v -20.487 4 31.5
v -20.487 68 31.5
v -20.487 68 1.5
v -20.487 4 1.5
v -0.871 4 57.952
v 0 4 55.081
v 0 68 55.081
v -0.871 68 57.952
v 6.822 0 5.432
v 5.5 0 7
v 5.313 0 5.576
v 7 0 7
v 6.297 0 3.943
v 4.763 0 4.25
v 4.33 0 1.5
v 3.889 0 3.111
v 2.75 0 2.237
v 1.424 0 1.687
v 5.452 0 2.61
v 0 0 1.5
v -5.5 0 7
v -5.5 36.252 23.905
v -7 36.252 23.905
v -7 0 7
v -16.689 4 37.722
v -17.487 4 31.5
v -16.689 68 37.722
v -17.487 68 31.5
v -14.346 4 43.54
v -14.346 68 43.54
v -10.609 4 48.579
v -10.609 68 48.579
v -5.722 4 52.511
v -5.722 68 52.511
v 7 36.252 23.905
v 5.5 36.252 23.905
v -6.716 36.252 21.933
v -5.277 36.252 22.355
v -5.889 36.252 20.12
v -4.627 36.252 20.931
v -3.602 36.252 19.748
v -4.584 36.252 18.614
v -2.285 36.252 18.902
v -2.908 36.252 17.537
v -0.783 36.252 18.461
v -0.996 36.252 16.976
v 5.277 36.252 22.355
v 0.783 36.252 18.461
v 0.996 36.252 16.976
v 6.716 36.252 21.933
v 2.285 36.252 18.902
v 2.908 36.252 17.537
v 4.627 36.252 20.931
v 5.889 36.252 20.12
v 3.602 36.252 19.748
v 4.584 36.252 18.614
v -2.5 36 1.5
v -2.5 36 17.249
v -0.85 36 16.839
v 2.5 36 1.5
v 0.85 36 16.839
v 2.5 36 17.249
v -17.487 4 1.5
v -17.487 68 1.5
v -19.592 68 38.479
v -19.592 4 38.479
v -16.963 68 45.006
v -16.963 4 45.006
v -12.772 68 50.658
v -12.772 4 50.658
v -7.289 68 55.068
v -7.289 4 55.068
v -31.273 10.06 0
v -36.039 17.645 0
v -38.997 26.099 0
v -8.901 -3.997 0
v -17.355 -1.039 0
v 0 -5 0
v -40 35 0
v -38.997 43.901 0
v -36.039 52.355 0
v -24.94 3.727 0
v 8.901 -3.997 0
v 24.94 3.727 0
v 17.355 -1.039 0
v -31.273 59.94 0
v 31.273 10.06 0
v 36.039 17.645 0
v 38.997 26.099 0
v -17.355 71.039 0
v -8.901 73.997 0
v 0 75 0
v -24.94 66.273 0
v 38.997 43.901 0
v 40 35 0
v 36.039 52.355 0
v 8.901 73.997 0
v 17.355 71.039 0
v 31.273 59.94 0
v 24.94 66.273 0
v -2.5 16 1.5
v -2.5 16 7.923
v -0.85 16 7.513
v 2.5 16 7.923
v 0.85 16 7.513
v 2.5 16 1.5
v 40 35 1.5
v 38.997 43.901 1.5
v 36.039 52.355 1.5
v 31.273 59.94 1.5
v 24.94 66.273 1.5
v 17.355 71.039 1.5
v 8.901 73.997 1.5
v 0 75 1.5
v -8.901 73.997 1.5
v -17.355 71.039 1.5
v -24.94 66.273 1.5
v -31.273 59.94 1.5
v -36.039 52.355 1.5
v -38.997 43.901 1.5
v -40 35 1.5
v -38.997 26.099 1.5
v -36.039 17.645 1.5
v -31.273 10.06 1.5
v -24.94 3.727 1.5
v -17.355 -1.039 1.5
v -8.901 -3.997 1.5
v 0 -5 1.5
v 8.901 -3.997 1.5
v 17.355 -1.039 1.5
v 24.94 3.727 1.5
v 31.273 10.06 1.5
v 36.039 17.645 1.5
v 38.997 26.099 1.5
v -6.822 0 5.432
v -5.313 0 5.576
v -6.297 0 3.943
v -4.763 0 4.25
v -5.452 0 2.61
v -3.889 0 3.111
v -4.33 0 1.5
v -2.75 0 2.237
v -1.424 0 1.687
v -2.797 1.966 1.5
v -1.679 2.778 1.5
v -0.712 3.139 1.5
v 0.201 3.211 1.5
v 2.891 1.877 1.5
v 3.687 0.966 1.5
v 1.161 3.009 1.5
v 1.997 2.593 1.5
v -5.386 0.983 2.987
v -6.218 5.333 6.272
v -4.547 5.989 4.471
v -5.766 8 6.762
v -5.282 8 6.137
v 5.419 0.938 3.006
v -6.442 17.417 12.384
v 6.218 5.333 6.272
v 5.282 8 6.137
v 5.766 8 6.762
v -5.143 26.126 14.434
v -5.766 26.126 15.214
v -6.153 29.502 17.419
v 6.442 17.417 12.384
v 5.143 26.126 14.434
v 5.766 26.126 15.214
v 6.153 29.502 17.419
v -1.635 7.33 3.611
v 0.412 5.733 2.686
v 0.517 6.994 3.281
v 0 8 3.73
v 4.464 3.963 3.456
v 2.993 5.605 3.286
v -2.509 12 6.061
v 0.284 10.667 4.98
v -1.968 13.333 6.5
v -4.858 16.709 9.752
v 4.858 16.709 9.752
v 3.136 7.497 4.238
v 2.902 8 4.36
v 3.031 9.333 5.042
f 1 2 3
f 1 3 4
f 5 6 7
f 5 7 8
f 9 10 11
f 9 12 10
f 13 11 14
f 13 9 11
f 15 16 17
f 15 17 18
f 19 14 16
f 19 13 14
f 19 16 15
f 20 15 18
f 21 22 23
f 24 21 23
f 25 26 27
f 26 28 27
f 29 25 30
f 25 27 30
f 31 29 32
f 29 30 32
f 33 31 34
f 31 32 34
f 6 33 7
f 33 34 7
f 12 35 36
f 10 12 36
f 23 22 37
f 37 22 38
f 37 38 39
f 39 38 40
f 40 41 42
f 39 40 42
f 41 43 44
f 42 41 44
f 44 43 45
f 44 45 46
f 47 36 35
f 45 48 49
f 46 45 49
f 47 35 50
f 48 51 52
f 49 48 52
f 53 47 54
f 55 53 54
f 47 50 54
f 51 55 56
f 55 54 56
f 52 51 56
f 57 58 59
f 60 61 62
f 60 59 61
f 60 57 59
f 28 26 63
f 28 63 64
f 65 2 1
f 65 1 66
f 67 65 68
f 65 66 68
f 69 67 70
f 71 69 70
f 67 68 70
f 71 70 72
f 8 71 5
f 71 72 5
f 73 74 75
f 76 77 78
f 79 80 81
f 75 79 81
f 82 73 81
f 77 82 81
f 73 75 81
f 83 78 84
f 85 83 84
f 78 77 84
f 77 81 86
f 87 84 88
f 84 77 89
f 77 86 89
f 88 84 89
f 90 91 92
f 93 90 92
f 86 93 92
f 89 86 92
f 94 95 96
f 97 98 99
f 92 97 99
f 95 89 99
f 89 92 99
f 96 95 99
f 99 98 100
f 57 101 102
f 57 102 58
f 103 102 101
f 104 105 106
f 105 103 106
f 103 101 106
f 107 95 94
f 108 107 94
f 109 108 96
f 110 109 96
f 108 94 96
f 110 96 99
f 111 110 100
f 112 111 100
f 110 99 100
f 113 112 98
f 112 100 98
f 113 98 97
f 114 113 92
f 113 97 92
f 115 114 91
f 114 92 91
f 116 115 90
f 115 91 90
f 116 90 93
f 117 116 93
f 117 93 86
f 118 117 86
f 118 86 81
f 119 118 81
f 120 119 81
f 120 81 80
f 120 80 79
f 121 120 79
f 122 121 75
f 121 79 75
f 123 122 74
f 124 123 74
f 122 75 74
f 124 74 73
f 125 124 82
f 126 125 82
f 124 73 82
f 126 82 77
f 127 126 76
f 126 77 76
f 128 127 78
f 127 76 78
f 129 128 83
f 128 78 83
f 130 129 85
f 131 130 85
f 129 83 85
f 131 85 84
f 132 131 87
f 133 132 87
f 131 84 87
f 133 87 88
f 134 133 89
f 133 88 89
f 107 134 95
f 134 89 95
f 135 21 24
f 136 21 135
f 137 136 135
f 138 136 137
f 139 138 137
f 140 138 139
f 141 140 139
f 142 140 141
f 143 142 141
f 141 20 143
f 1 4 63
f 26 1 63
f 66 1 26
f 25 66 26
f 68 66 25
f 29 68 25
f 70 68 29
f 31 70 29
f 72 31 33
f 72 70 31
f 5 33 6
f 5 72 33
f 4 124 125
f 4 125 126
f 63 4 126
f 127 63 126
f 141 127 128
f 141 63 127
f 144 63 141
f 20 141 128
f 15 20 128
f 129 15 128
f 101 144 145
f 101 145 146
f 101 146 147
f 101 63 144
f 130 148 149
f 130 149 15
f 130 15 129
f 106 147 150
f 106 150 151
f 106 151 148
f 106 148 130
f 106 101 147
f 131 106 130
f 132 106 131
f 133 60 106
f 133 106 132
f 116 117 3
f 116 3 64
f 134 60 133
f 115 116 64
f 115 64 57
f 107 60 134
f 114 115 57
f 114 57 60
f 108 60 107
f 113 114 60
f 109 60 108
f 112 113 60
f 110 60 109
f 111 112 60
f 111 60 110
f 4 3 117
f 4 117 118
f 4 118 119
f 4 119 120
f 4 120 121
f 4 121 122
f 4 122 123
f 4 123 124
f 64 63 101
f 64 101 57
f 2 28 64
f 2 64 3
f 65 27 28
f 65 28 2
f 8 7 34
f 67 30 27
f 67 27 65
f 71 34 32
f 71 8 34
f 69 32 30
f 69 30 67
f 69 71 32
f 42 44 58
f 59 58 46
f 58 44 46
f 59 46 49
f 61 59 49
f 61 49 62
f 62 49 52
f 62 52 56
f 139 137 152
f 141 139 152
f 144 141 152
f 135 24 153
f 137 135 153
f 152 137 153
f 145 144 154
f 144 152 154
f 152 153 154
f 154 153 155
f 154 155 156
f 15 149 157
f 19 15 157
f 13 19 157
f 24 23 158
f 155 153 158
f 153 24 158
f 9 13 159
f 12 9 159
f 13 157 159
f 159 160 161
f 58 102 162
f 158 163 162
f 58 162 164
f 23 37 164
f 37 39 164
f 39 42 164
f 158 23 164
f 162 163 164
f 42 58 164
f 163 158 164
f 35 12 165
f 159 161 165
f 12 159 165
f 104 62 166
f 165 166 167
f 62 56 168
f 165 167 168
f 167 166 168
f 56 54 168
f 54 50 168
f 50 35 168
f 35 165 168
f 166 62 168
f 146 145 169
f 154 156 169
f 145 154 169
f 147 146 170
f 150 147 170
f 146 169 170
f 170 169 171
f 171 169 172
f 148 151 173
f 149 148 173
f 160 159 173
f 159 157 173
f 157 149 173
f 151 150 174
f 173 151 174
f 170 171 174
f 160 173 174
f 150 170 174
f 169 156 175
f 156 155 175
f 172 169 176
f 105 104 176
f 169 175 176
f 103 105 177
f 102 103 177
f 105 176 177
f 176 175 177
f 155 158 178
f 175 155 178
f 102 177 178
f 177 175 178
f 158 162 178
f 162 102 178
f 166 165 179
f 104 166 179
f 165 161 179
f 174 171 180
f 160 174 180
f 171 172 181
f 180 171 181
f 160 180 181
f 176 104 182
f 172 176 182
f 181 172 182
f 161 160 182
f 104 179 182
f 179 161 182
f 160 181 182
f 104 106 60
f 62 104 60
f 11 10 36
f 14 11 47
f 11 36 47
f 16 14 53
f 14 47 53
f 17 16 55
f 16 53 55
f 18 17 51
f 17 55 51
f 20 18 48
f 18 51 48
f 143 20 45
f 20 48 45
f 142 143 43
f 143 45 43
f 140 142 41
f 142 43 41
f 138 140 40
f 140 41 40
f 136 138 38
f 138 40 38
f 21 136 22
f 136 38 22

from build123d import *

# Parameters (mm, degrees)
F3_W     = 5
F3_H     = 20
F3_R     = 40
F5_DEPTH = 1.5
F6_W     = 3
F6_H     = 64


with BuildPart() as f2:
    # F2: sweep along a path in F1
    with BuildLine(Plane.YZ) as f2_path:
        Line((0, 0), (36.2523114815, 16.9047304696))
    # F0 (on Front) → F2 (sweep)
    with BuildSketch(Plane.XZ):
        with BuildLine():
            Line((-5.5, 7), (-7, 7))
            ThreePointArc((-7, 7), (0, 0), (7, 7))
            Line((7, 7), (5.5, 7))
            ThreePointArc((5.5, 7), (0, 1.5), (-5.5, 7))
        make_face()
    sweep(path=f2_path.line)

    # F3 (on Top) → F4 (join, up to the next surface of F2)
    with BuildSketch(Plane.XY):
        with Locations((0, 26)):
            Rectangle(F3_W, F3_H)
    extrude(until=Until.NEXT)

    # F3 (on Top) → F5 (join)
    with BuildSketch(Plane.XY):
        with Locations((0, 35)):
            Circle(F3_R)
        with Locations((0, 26)):
            Rectangle(F3_W, F3_H, mode=Mode.SUBTRACT)
    extrude(amount=F5_DEPTH)

    # F9: sweep along a path in F8
    with BuildLine(Plane.XZ.offset(-68)) as f9_path:
        Line((-17.4873532057, 1.5), (-17.4873532057, 31.5))
        ThreePointArc((-17.4873532057, 31.5), (-12.6384664104, 46.1788768101), (0, 55.08114025))
    # F6 (on face) → F9 (sweep)
    with BuildSketch(Plane.XY.offset(1.5)):
        with Locations((-18.9873532057, 36)):
            Rectangle(F6_W, F6_H)
    sweep(path=f9_path.line)


solid = f2.part
